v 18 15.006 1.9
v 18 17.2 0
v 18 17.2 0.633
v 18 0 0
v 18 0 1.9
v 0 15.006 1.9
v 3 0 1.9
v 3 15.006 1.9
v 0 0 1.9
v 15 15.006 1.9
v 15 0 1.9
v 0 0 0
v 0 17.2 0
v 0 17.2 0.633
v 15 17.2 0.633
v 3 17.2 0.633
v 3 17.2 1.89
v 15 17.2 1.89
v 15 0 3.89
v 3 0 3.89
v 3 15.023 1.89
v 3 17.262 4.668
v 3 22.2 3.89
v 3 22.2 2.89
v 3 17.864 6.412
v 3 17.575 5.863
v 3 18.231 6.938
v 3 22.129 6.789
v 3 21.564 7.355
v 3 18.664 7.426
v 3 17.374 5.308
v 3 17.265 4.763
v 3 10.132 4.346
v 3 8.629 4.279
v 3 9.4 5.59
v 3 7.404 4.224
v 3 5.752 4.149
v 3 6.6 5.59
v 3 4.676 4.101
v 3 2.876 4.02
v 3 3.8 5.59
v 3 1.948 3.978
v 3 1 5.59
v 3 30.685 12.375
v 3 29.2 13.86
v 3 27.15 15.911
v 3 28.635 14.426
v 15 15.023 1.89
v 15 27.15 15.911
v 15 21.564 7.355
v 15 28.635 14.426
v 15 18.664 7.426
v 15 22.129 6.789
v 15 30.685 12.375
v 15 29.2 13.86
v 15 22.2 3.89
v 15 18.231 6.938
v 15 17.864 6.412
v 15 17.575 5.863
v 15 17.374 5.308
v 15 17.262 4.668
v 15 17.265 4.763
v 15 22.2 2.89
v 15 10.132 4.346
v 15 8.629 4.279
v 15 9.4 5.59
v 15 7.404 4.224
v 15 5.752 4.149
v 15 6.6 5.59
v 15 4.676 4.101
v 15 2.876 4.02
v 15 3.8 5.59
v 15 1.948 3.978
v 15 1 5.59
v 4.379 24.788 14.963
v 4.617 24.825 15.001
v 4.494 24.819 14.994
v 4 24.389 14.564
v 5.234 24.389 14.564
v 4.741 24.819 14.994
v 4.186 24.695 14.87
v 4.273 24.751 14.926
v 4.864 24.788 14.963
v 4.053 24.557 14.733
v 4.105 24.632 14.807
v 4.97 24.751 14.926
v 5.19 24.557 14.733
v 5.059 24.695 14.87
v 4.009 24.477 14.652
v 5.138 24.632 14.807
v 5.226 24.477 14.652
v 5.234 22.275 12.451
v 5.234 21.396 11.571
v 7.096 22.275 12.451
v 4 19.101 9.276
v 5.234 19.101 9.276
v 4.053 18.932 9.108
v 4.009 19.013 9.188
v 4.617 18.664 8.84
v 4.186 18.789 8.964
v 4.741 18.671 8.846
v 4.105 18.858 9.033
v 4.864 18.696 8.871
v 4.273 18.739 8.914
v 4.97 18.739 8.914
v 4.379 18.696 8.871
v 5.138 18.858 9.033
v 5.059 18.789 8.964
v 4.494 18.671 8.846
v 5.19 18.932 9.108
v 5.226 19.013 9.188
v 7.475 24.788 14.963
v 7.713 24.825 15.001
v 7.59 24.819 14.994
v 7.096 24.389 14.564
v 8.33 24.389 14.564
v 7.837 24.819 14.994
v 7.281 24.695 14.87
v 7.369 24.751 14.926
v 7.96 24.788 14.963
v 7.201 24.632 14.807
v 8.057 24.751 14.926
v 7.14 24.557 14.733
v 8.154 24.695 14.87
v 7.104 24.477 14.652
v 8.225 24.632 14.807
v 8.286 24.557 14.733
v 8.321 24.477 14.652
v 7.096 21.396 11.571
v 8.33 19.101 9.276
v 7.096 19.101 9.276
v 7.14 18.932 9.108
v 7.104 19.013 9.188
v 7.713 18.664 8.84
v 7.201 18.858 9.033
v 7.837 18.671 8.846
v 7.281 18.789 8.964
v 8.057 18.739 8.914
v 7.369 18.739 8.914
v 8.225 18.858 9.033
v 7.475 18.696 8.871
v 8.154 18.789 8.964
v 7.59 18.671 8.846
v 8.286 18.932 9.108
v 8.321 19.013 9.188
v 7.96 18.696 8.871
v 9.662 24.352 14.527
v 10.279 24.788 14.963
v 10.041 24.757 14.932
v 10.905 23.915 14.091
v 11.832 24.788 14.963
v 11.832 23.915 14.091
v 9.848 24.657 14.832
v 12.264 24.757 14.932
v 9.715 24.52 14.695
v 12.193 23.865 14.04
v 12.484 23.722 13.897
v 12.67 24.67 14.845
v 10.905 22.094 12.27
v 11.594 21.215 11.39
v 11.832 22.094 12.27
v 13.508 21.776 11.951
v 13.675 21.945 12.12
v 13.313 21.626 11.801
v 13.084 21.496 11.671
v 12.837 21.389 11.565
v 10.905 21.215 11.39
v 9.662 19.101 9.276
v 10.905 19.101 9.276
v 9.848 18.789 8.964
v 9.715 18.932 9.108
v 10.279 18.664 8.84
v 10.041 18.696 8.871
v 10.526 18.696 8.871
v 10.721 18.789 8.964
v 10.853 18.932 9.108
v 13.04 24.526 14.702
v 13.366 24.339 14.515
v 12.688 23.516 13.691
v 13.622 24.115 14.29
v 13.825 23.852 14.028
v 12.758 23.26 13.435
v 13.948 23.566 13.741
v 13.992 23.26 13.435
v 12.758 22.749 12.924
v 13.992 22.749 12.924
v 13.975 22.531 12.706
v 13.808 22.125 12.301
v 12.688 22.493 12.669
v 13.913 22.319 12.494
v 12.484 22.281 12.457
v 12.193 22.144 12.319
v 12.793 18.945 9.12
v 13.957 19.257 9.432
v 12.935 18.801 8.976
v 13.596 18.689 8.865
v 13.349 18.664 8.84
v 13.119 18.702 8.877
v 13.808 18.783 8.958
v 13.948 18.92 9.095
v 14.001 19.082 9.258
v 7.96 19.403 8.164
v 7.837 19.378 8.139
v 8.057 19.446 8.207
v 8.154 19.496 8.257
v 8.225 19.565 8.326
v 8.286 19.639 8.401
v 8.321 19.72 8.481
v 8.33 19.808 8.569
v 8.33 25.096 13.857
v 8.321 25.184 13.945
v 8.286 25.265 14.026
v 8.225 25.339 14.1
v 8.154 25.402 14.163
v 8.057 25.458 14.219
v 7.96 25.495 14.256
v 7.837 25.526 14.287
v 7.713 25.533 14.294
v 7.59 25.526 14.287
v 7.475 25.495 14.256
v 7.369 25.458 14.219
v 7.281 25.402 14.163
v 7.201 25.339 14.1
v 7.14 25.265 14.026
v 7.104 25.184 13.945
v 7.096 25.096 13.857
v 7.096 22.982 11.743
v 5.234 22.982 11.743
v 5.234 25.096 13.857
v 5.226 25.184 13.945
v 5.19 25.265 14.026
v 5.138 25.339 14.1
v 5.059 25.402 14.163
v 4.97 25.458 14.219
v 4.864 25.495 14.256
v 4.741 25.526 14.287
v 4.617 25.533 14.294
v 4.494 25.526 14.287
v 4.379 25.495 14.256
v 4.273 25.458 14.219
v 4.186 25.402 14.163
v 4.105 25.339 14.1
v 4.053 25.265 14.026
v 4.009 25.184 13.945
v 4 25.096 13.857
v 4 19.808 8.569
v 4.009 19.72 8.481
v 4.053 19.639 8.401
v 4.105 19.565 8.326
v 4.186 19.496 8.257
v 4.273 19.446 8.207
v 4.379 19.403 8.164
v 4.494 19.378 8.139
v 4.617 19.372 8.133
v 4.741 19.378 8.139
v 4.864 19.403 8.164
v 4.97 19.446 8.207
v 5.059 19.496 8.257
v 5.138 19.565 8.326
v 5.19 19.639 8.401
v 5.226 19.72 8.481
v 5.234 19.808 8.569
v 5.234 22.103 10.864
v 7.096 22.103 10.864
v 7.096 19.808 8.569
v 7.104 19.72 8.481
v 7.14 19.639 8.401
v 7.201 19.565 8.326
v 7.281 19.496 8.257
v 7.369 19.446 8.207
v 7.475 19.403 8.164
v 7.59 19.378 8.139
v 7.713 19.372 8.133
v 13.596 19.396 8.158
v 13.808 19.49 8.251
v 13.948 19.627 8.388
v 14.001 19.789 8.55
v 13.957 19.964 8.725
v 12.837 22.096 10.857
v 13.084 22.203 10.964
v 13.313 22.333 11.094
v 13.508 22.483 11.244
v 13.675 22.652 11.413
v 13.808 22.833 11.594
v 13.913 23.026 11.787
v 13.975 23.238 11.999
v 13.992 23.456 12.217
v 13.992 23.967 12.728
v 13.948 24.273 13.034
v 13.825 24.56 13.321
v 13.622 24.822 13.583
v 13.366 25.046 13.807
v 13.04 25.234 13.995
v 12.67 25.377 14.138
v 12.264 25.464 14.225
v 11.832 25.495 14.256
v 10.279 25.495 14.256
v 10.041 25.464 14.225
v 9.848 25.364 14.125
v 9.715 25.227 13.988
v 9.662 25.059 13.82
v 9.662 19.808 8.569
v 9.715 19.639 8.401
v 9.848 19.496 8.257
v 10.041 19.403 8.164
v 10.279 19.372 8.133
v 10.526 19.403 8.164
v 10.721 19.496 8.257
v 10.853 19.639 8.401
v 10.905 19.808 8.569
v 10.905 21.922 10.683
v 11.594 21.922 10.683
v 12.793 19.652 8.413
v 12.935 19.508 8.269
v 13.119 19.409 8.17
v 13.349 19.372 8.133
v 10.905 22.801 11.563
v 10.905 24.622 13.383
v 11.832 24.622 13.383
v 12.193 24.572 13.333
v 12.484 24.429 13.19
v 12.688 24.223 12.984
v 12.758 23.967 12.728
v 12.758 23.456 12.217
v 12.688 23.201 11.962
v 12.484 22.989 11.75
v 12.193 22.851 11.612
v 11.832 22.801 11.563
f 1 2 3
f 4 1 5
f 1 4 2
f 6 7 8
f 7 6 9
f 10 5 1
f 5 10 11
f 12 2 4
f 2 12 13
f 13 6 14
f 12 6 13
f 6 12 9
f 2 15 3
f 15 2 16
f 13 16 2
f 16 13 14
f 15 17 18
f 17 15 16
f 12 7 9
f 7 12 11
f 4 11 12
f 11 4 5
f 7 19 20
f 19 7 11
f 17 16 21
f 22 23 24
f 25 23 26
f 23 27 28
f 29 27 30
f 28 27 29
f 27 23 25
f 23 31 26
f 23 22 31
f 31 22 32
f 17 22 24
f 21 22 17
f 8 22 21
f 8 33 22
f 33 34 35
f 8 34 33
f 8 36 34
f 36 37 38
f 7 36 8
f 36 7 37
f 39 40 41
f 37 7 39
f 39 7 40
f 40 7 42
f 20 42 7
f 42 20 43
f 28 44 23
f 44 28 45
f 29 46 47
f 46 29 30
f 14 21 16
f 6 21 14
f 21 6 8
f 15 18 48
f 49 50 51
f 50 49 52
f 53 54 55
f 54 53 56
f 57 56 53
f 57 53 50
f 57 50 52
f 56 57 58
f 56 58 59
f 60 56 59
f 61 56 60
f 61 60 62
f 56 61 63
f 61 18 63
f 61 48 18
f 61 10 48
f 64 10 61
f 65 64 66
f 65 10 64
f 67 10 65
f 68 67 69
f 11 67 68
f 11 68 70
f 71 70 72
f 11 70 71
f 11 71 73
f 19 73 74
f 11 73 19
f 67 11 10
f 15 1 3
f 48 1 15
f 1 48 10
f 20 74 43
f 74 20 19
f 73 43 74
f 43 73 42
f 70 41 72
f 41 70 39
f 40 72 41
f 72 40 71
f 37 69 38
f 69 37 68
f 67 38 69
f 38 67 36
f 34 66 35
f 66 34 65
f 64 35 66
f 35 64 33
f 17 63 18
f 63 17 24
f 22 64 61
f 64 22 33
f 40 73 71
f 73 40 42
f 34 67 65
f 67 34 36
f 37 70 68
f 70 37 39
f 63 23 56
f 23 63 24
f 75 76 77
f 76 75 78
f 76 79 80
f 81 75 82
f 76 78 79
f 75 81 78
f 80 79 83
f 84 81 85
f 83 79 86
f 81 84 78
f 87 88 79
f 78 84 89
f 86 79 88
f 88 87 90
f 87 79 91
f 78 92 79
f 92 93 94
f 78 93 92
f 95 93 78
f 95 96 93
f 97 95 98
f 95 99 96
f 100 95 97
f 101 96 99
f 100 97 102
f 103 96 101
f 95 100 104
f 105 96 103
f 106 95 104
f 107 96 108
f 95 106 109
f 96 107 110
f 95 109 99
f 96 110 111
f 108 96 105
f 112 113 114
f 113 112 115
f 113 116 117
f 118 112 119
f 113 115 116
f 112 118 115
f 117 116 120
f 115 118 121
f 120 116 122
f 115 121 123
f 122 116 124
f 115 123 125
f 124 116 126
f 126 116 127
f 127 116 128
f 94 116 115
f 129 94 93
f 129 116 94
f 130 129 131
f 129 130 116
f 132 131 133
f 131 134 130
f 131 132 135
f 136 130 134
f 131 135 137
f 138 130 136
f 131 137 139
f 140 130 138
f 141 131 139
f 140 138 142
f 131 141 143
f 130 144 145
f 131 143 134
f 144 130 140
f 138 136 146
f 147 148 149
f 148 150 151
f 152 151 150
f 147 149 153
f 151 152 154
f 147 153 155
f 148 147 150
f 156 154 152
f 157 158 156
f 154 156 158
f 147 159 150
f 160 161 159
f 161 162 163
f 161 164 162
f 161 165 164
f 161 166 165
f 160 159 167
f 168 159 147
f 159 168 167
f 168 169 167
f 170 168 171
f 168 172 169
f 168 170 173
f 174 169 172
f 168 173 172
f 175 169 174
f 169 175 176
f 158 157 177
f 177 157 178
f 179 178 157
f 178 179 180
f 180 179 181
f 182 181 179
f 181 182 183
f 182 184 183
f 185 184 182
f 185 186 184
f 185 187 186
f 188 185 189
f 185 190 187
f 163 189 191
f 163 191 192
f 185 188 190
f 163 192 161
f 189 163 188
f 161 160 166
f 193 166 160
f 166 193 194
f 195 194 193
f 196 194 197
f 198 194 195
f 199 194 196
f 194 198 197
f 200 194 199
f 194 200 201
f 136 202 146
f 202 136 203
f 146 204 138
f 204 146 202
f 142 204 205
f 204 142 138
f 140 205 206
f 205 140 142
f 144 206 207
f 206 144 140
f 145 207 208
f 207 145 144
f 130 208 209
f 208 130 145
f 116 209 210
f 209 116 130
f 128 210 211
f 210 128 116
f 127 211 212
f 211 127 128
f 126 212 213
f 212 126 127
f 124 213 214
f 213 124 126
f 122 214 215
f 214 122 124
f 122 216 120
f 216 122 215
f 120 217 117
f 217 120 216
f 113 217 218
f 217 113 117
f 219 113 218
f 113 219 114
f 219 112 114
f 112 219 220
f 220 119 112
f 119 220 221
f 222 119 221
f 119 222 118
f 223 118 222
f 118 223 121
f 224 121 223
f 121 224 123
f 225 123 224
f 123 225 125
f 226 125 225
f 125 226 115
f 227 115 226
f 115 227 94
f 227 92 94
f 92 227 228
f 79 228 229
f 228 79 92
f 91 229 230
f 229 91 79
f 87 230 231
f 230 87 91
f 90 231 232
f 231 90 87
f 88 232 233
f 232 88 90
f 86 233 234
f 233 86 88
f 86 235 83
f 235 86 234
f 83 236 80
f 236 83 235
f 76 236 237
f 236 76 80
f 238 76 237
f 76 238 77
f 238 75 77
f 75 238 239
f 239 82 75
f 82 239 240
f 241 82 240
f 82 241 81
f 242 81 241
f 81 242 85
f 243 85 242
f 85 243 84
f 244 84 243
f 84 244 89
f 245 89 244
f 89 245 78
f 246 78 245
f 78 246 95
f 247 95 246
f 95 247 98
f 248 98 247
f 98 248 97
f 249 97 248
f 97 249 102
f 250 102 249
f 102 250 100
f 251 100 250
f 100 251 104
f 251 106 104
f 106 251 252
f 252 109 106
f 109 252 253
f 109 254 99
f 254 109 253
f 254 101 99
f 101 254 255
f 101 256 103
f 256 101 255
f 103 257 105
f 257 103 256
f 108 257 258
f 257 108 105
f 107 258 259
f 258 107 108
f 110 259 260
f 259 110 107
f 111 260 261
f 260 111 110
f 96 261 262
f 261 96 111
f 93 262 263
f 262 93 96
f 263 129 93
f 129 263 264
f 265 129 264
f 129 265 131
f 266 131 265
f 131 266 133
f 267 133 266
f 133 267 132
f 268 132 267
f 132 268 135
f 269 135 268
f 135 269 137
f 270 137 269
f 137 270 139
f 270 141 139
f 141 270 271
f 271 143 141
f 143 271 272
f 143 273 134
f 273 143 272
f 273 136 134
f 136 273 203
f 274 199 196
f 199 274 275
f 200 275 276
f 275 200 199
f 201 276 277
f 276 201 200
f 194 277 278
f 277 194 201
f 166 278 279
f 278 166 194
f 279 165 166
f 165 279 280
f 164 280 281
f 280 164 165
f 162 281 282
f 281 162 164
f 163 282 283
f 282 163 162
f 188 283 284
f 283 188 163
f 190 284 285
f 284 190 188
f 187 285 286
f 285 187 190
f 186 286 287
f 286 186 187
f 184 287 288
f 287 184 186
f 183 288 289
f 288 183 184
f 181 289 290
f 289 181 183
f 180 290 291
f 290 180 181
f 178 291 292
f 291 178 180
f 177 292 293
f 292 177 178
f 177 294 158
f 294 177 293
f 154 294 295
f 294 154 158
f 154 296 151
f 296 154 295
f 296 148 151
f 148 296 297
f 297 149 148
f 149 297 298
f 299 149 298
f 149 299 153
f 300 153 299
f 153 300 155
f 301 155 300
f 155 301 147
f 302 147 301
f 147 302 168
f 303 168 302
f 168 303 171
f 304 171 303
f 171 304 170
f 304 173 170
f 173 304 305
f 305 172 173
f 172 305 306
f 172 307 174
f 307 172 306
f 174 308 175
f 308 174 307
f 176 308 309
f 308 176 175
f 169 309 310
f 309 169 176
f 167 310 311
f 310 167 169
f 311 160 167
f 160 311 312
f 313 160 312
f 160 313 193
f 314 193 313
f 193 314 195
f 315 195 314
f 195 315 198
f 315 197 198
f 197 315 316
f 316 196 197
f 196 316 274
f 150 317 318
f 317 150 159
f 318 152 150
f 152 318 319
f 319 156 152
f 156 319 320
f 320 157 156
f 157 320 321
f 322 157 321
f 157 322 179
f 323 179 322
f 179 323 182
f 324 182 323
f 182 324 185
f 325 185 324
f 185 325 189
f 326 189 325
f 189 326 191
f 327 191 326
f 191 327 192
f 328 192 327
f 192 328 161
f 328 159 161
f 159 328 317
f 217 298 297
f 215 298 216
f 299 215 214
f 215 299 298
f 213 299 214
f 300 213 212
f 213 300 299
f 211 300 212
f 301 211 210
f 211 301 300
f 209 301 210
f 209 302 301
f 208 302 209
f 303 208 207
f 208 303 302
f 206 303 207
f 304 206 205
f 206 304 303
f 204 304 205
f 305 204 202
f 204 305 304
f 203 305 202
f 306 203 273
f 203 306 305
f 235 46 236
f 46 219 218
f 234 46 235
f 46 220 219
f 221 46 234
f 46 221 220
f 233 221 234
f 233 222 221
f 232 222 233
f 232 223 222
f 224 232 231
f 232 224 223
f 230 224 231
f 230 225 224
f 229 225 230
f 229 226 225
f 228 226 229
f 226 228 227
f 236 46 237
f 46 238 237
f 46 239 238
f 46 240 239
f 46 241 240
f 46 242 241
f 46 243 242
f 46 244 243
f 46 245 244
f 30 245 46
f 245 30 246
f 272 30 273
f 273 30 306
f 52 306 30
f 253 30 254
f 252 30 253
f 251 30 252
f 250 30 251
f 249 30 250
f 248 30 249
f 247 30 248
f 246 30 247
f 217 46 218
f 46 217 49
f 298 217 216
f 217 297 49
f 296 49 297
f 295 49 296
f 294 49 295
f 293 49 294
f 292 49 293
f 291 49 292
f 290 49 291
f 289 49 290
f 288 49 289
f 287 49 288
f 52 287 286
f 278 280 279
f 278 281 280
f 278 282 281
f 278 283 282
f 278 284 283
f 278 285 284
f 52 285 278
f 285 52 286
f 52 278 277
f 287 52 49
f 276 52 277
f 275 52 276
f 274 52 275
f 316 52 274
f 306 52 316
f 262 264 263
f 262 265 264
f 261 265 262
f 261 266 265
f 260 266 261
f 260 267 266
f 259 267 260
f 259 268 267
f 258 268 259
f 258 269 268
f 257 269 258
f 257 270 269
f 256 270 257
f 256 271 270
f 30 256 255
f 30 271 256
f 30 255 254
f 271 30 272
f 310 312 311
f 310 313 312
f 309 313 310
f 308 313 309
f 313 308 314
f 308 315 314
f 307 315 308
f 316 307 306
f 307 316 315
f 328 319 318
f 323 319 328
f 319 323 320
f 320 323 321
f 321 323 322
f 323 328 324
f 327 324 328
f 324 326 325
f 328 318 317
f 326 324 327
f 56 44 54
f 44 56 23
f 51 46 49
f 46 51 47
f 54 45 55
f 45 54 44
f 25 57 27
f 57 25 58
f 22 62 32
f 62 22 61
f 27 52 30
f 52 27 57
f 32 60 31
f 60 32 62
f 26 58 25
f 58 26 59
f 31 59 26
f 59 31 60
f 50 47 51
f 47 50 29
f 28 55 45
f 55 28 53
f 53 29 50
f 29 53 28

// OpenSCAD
// file: hotshoe_paper_clip.scad
hs_w      = 18.0;
hs_l      = 17.2;
hs_h      = 1.9; // 2
hs2_w     = 12;
//hs2_l     = hs_l+5;
hs2_h     = 2;
hs2_x_off = (hs_w-hs2_w)/2;
hs2_elev  = 1;
hs3_l     = 12;
hs3_h     = 5;
hs3_w     = 0.8;

module hotshoe(
    logofile="", logooffset=1,
    len=5
    ) {
    hs2_l = hs_l+len;
    union() {
        // lower hotshoe
        difference() {
            cube([hs_w, hs_l, hs_h]);
            translate([-1,hs_l,hs_h/3]) rotate([60,0,0]) cube([hs2_x_off+1, 10,10]);
            translate([hs2_x_off+hs2_w,hs_l,hs_h/3]) rotate([60,0,0]) cube([hs2_x_off+1, 10,10]);
        }
        // upper plate including grip
        translate([hs2_x_off, 0, hs_h-0.01]) {
            rotate([90,0,90])
            linear_extrude(height=hs2_w) {
                polygon(
                points=[[0,0], [hs2_l,0], [hs_l,0], [hs2_l,hs2_elev],[hs2_l,hs2_elev+hs2_h],
                //[hs_l,hs2_h],
                [0,hs2_h]],
                paths=[[0,1,2,3,4,5,6]]
                );
            }
            for ( i = [0:3]) {
                translate([hs2_w/2,1+2.8*(i),hs2_h]) scale([1,1,1.7]) rotate([45,0,0]) cube([hs2_w,sqrt(2), sqrt(2)], center=true);
            }
        }
        translate([hs2_x_off, hs2_l, hs_h+hs2_elev+hs2_h/2-0.01])
        rotate([45,0,0])
        difference() {
            union() {
                // Logo
                translate([logooffset,1,hs3_h-1]) linear_extrude(height=1+1) import(file=logofile);
                // clasp
                cube([hs2_w, hs3_l, hs3_h]);
                translate([0,0,hs3_h/2]) scale([1,1.5,1]) rotate([0,90,0]) cylinder(h=hs2_w, r=hs3_h/2, $fn=36);
            }
            translate([-1,2,(hs3_h-hs3_w)/2]) cube([hs2_w+2, hs3_l, hs3_w]);
        }
    }
}
// main file
include <hotshoe_paper_clip.scad>

hotshoe(logofile="HR.dxf", logooffset=1);
